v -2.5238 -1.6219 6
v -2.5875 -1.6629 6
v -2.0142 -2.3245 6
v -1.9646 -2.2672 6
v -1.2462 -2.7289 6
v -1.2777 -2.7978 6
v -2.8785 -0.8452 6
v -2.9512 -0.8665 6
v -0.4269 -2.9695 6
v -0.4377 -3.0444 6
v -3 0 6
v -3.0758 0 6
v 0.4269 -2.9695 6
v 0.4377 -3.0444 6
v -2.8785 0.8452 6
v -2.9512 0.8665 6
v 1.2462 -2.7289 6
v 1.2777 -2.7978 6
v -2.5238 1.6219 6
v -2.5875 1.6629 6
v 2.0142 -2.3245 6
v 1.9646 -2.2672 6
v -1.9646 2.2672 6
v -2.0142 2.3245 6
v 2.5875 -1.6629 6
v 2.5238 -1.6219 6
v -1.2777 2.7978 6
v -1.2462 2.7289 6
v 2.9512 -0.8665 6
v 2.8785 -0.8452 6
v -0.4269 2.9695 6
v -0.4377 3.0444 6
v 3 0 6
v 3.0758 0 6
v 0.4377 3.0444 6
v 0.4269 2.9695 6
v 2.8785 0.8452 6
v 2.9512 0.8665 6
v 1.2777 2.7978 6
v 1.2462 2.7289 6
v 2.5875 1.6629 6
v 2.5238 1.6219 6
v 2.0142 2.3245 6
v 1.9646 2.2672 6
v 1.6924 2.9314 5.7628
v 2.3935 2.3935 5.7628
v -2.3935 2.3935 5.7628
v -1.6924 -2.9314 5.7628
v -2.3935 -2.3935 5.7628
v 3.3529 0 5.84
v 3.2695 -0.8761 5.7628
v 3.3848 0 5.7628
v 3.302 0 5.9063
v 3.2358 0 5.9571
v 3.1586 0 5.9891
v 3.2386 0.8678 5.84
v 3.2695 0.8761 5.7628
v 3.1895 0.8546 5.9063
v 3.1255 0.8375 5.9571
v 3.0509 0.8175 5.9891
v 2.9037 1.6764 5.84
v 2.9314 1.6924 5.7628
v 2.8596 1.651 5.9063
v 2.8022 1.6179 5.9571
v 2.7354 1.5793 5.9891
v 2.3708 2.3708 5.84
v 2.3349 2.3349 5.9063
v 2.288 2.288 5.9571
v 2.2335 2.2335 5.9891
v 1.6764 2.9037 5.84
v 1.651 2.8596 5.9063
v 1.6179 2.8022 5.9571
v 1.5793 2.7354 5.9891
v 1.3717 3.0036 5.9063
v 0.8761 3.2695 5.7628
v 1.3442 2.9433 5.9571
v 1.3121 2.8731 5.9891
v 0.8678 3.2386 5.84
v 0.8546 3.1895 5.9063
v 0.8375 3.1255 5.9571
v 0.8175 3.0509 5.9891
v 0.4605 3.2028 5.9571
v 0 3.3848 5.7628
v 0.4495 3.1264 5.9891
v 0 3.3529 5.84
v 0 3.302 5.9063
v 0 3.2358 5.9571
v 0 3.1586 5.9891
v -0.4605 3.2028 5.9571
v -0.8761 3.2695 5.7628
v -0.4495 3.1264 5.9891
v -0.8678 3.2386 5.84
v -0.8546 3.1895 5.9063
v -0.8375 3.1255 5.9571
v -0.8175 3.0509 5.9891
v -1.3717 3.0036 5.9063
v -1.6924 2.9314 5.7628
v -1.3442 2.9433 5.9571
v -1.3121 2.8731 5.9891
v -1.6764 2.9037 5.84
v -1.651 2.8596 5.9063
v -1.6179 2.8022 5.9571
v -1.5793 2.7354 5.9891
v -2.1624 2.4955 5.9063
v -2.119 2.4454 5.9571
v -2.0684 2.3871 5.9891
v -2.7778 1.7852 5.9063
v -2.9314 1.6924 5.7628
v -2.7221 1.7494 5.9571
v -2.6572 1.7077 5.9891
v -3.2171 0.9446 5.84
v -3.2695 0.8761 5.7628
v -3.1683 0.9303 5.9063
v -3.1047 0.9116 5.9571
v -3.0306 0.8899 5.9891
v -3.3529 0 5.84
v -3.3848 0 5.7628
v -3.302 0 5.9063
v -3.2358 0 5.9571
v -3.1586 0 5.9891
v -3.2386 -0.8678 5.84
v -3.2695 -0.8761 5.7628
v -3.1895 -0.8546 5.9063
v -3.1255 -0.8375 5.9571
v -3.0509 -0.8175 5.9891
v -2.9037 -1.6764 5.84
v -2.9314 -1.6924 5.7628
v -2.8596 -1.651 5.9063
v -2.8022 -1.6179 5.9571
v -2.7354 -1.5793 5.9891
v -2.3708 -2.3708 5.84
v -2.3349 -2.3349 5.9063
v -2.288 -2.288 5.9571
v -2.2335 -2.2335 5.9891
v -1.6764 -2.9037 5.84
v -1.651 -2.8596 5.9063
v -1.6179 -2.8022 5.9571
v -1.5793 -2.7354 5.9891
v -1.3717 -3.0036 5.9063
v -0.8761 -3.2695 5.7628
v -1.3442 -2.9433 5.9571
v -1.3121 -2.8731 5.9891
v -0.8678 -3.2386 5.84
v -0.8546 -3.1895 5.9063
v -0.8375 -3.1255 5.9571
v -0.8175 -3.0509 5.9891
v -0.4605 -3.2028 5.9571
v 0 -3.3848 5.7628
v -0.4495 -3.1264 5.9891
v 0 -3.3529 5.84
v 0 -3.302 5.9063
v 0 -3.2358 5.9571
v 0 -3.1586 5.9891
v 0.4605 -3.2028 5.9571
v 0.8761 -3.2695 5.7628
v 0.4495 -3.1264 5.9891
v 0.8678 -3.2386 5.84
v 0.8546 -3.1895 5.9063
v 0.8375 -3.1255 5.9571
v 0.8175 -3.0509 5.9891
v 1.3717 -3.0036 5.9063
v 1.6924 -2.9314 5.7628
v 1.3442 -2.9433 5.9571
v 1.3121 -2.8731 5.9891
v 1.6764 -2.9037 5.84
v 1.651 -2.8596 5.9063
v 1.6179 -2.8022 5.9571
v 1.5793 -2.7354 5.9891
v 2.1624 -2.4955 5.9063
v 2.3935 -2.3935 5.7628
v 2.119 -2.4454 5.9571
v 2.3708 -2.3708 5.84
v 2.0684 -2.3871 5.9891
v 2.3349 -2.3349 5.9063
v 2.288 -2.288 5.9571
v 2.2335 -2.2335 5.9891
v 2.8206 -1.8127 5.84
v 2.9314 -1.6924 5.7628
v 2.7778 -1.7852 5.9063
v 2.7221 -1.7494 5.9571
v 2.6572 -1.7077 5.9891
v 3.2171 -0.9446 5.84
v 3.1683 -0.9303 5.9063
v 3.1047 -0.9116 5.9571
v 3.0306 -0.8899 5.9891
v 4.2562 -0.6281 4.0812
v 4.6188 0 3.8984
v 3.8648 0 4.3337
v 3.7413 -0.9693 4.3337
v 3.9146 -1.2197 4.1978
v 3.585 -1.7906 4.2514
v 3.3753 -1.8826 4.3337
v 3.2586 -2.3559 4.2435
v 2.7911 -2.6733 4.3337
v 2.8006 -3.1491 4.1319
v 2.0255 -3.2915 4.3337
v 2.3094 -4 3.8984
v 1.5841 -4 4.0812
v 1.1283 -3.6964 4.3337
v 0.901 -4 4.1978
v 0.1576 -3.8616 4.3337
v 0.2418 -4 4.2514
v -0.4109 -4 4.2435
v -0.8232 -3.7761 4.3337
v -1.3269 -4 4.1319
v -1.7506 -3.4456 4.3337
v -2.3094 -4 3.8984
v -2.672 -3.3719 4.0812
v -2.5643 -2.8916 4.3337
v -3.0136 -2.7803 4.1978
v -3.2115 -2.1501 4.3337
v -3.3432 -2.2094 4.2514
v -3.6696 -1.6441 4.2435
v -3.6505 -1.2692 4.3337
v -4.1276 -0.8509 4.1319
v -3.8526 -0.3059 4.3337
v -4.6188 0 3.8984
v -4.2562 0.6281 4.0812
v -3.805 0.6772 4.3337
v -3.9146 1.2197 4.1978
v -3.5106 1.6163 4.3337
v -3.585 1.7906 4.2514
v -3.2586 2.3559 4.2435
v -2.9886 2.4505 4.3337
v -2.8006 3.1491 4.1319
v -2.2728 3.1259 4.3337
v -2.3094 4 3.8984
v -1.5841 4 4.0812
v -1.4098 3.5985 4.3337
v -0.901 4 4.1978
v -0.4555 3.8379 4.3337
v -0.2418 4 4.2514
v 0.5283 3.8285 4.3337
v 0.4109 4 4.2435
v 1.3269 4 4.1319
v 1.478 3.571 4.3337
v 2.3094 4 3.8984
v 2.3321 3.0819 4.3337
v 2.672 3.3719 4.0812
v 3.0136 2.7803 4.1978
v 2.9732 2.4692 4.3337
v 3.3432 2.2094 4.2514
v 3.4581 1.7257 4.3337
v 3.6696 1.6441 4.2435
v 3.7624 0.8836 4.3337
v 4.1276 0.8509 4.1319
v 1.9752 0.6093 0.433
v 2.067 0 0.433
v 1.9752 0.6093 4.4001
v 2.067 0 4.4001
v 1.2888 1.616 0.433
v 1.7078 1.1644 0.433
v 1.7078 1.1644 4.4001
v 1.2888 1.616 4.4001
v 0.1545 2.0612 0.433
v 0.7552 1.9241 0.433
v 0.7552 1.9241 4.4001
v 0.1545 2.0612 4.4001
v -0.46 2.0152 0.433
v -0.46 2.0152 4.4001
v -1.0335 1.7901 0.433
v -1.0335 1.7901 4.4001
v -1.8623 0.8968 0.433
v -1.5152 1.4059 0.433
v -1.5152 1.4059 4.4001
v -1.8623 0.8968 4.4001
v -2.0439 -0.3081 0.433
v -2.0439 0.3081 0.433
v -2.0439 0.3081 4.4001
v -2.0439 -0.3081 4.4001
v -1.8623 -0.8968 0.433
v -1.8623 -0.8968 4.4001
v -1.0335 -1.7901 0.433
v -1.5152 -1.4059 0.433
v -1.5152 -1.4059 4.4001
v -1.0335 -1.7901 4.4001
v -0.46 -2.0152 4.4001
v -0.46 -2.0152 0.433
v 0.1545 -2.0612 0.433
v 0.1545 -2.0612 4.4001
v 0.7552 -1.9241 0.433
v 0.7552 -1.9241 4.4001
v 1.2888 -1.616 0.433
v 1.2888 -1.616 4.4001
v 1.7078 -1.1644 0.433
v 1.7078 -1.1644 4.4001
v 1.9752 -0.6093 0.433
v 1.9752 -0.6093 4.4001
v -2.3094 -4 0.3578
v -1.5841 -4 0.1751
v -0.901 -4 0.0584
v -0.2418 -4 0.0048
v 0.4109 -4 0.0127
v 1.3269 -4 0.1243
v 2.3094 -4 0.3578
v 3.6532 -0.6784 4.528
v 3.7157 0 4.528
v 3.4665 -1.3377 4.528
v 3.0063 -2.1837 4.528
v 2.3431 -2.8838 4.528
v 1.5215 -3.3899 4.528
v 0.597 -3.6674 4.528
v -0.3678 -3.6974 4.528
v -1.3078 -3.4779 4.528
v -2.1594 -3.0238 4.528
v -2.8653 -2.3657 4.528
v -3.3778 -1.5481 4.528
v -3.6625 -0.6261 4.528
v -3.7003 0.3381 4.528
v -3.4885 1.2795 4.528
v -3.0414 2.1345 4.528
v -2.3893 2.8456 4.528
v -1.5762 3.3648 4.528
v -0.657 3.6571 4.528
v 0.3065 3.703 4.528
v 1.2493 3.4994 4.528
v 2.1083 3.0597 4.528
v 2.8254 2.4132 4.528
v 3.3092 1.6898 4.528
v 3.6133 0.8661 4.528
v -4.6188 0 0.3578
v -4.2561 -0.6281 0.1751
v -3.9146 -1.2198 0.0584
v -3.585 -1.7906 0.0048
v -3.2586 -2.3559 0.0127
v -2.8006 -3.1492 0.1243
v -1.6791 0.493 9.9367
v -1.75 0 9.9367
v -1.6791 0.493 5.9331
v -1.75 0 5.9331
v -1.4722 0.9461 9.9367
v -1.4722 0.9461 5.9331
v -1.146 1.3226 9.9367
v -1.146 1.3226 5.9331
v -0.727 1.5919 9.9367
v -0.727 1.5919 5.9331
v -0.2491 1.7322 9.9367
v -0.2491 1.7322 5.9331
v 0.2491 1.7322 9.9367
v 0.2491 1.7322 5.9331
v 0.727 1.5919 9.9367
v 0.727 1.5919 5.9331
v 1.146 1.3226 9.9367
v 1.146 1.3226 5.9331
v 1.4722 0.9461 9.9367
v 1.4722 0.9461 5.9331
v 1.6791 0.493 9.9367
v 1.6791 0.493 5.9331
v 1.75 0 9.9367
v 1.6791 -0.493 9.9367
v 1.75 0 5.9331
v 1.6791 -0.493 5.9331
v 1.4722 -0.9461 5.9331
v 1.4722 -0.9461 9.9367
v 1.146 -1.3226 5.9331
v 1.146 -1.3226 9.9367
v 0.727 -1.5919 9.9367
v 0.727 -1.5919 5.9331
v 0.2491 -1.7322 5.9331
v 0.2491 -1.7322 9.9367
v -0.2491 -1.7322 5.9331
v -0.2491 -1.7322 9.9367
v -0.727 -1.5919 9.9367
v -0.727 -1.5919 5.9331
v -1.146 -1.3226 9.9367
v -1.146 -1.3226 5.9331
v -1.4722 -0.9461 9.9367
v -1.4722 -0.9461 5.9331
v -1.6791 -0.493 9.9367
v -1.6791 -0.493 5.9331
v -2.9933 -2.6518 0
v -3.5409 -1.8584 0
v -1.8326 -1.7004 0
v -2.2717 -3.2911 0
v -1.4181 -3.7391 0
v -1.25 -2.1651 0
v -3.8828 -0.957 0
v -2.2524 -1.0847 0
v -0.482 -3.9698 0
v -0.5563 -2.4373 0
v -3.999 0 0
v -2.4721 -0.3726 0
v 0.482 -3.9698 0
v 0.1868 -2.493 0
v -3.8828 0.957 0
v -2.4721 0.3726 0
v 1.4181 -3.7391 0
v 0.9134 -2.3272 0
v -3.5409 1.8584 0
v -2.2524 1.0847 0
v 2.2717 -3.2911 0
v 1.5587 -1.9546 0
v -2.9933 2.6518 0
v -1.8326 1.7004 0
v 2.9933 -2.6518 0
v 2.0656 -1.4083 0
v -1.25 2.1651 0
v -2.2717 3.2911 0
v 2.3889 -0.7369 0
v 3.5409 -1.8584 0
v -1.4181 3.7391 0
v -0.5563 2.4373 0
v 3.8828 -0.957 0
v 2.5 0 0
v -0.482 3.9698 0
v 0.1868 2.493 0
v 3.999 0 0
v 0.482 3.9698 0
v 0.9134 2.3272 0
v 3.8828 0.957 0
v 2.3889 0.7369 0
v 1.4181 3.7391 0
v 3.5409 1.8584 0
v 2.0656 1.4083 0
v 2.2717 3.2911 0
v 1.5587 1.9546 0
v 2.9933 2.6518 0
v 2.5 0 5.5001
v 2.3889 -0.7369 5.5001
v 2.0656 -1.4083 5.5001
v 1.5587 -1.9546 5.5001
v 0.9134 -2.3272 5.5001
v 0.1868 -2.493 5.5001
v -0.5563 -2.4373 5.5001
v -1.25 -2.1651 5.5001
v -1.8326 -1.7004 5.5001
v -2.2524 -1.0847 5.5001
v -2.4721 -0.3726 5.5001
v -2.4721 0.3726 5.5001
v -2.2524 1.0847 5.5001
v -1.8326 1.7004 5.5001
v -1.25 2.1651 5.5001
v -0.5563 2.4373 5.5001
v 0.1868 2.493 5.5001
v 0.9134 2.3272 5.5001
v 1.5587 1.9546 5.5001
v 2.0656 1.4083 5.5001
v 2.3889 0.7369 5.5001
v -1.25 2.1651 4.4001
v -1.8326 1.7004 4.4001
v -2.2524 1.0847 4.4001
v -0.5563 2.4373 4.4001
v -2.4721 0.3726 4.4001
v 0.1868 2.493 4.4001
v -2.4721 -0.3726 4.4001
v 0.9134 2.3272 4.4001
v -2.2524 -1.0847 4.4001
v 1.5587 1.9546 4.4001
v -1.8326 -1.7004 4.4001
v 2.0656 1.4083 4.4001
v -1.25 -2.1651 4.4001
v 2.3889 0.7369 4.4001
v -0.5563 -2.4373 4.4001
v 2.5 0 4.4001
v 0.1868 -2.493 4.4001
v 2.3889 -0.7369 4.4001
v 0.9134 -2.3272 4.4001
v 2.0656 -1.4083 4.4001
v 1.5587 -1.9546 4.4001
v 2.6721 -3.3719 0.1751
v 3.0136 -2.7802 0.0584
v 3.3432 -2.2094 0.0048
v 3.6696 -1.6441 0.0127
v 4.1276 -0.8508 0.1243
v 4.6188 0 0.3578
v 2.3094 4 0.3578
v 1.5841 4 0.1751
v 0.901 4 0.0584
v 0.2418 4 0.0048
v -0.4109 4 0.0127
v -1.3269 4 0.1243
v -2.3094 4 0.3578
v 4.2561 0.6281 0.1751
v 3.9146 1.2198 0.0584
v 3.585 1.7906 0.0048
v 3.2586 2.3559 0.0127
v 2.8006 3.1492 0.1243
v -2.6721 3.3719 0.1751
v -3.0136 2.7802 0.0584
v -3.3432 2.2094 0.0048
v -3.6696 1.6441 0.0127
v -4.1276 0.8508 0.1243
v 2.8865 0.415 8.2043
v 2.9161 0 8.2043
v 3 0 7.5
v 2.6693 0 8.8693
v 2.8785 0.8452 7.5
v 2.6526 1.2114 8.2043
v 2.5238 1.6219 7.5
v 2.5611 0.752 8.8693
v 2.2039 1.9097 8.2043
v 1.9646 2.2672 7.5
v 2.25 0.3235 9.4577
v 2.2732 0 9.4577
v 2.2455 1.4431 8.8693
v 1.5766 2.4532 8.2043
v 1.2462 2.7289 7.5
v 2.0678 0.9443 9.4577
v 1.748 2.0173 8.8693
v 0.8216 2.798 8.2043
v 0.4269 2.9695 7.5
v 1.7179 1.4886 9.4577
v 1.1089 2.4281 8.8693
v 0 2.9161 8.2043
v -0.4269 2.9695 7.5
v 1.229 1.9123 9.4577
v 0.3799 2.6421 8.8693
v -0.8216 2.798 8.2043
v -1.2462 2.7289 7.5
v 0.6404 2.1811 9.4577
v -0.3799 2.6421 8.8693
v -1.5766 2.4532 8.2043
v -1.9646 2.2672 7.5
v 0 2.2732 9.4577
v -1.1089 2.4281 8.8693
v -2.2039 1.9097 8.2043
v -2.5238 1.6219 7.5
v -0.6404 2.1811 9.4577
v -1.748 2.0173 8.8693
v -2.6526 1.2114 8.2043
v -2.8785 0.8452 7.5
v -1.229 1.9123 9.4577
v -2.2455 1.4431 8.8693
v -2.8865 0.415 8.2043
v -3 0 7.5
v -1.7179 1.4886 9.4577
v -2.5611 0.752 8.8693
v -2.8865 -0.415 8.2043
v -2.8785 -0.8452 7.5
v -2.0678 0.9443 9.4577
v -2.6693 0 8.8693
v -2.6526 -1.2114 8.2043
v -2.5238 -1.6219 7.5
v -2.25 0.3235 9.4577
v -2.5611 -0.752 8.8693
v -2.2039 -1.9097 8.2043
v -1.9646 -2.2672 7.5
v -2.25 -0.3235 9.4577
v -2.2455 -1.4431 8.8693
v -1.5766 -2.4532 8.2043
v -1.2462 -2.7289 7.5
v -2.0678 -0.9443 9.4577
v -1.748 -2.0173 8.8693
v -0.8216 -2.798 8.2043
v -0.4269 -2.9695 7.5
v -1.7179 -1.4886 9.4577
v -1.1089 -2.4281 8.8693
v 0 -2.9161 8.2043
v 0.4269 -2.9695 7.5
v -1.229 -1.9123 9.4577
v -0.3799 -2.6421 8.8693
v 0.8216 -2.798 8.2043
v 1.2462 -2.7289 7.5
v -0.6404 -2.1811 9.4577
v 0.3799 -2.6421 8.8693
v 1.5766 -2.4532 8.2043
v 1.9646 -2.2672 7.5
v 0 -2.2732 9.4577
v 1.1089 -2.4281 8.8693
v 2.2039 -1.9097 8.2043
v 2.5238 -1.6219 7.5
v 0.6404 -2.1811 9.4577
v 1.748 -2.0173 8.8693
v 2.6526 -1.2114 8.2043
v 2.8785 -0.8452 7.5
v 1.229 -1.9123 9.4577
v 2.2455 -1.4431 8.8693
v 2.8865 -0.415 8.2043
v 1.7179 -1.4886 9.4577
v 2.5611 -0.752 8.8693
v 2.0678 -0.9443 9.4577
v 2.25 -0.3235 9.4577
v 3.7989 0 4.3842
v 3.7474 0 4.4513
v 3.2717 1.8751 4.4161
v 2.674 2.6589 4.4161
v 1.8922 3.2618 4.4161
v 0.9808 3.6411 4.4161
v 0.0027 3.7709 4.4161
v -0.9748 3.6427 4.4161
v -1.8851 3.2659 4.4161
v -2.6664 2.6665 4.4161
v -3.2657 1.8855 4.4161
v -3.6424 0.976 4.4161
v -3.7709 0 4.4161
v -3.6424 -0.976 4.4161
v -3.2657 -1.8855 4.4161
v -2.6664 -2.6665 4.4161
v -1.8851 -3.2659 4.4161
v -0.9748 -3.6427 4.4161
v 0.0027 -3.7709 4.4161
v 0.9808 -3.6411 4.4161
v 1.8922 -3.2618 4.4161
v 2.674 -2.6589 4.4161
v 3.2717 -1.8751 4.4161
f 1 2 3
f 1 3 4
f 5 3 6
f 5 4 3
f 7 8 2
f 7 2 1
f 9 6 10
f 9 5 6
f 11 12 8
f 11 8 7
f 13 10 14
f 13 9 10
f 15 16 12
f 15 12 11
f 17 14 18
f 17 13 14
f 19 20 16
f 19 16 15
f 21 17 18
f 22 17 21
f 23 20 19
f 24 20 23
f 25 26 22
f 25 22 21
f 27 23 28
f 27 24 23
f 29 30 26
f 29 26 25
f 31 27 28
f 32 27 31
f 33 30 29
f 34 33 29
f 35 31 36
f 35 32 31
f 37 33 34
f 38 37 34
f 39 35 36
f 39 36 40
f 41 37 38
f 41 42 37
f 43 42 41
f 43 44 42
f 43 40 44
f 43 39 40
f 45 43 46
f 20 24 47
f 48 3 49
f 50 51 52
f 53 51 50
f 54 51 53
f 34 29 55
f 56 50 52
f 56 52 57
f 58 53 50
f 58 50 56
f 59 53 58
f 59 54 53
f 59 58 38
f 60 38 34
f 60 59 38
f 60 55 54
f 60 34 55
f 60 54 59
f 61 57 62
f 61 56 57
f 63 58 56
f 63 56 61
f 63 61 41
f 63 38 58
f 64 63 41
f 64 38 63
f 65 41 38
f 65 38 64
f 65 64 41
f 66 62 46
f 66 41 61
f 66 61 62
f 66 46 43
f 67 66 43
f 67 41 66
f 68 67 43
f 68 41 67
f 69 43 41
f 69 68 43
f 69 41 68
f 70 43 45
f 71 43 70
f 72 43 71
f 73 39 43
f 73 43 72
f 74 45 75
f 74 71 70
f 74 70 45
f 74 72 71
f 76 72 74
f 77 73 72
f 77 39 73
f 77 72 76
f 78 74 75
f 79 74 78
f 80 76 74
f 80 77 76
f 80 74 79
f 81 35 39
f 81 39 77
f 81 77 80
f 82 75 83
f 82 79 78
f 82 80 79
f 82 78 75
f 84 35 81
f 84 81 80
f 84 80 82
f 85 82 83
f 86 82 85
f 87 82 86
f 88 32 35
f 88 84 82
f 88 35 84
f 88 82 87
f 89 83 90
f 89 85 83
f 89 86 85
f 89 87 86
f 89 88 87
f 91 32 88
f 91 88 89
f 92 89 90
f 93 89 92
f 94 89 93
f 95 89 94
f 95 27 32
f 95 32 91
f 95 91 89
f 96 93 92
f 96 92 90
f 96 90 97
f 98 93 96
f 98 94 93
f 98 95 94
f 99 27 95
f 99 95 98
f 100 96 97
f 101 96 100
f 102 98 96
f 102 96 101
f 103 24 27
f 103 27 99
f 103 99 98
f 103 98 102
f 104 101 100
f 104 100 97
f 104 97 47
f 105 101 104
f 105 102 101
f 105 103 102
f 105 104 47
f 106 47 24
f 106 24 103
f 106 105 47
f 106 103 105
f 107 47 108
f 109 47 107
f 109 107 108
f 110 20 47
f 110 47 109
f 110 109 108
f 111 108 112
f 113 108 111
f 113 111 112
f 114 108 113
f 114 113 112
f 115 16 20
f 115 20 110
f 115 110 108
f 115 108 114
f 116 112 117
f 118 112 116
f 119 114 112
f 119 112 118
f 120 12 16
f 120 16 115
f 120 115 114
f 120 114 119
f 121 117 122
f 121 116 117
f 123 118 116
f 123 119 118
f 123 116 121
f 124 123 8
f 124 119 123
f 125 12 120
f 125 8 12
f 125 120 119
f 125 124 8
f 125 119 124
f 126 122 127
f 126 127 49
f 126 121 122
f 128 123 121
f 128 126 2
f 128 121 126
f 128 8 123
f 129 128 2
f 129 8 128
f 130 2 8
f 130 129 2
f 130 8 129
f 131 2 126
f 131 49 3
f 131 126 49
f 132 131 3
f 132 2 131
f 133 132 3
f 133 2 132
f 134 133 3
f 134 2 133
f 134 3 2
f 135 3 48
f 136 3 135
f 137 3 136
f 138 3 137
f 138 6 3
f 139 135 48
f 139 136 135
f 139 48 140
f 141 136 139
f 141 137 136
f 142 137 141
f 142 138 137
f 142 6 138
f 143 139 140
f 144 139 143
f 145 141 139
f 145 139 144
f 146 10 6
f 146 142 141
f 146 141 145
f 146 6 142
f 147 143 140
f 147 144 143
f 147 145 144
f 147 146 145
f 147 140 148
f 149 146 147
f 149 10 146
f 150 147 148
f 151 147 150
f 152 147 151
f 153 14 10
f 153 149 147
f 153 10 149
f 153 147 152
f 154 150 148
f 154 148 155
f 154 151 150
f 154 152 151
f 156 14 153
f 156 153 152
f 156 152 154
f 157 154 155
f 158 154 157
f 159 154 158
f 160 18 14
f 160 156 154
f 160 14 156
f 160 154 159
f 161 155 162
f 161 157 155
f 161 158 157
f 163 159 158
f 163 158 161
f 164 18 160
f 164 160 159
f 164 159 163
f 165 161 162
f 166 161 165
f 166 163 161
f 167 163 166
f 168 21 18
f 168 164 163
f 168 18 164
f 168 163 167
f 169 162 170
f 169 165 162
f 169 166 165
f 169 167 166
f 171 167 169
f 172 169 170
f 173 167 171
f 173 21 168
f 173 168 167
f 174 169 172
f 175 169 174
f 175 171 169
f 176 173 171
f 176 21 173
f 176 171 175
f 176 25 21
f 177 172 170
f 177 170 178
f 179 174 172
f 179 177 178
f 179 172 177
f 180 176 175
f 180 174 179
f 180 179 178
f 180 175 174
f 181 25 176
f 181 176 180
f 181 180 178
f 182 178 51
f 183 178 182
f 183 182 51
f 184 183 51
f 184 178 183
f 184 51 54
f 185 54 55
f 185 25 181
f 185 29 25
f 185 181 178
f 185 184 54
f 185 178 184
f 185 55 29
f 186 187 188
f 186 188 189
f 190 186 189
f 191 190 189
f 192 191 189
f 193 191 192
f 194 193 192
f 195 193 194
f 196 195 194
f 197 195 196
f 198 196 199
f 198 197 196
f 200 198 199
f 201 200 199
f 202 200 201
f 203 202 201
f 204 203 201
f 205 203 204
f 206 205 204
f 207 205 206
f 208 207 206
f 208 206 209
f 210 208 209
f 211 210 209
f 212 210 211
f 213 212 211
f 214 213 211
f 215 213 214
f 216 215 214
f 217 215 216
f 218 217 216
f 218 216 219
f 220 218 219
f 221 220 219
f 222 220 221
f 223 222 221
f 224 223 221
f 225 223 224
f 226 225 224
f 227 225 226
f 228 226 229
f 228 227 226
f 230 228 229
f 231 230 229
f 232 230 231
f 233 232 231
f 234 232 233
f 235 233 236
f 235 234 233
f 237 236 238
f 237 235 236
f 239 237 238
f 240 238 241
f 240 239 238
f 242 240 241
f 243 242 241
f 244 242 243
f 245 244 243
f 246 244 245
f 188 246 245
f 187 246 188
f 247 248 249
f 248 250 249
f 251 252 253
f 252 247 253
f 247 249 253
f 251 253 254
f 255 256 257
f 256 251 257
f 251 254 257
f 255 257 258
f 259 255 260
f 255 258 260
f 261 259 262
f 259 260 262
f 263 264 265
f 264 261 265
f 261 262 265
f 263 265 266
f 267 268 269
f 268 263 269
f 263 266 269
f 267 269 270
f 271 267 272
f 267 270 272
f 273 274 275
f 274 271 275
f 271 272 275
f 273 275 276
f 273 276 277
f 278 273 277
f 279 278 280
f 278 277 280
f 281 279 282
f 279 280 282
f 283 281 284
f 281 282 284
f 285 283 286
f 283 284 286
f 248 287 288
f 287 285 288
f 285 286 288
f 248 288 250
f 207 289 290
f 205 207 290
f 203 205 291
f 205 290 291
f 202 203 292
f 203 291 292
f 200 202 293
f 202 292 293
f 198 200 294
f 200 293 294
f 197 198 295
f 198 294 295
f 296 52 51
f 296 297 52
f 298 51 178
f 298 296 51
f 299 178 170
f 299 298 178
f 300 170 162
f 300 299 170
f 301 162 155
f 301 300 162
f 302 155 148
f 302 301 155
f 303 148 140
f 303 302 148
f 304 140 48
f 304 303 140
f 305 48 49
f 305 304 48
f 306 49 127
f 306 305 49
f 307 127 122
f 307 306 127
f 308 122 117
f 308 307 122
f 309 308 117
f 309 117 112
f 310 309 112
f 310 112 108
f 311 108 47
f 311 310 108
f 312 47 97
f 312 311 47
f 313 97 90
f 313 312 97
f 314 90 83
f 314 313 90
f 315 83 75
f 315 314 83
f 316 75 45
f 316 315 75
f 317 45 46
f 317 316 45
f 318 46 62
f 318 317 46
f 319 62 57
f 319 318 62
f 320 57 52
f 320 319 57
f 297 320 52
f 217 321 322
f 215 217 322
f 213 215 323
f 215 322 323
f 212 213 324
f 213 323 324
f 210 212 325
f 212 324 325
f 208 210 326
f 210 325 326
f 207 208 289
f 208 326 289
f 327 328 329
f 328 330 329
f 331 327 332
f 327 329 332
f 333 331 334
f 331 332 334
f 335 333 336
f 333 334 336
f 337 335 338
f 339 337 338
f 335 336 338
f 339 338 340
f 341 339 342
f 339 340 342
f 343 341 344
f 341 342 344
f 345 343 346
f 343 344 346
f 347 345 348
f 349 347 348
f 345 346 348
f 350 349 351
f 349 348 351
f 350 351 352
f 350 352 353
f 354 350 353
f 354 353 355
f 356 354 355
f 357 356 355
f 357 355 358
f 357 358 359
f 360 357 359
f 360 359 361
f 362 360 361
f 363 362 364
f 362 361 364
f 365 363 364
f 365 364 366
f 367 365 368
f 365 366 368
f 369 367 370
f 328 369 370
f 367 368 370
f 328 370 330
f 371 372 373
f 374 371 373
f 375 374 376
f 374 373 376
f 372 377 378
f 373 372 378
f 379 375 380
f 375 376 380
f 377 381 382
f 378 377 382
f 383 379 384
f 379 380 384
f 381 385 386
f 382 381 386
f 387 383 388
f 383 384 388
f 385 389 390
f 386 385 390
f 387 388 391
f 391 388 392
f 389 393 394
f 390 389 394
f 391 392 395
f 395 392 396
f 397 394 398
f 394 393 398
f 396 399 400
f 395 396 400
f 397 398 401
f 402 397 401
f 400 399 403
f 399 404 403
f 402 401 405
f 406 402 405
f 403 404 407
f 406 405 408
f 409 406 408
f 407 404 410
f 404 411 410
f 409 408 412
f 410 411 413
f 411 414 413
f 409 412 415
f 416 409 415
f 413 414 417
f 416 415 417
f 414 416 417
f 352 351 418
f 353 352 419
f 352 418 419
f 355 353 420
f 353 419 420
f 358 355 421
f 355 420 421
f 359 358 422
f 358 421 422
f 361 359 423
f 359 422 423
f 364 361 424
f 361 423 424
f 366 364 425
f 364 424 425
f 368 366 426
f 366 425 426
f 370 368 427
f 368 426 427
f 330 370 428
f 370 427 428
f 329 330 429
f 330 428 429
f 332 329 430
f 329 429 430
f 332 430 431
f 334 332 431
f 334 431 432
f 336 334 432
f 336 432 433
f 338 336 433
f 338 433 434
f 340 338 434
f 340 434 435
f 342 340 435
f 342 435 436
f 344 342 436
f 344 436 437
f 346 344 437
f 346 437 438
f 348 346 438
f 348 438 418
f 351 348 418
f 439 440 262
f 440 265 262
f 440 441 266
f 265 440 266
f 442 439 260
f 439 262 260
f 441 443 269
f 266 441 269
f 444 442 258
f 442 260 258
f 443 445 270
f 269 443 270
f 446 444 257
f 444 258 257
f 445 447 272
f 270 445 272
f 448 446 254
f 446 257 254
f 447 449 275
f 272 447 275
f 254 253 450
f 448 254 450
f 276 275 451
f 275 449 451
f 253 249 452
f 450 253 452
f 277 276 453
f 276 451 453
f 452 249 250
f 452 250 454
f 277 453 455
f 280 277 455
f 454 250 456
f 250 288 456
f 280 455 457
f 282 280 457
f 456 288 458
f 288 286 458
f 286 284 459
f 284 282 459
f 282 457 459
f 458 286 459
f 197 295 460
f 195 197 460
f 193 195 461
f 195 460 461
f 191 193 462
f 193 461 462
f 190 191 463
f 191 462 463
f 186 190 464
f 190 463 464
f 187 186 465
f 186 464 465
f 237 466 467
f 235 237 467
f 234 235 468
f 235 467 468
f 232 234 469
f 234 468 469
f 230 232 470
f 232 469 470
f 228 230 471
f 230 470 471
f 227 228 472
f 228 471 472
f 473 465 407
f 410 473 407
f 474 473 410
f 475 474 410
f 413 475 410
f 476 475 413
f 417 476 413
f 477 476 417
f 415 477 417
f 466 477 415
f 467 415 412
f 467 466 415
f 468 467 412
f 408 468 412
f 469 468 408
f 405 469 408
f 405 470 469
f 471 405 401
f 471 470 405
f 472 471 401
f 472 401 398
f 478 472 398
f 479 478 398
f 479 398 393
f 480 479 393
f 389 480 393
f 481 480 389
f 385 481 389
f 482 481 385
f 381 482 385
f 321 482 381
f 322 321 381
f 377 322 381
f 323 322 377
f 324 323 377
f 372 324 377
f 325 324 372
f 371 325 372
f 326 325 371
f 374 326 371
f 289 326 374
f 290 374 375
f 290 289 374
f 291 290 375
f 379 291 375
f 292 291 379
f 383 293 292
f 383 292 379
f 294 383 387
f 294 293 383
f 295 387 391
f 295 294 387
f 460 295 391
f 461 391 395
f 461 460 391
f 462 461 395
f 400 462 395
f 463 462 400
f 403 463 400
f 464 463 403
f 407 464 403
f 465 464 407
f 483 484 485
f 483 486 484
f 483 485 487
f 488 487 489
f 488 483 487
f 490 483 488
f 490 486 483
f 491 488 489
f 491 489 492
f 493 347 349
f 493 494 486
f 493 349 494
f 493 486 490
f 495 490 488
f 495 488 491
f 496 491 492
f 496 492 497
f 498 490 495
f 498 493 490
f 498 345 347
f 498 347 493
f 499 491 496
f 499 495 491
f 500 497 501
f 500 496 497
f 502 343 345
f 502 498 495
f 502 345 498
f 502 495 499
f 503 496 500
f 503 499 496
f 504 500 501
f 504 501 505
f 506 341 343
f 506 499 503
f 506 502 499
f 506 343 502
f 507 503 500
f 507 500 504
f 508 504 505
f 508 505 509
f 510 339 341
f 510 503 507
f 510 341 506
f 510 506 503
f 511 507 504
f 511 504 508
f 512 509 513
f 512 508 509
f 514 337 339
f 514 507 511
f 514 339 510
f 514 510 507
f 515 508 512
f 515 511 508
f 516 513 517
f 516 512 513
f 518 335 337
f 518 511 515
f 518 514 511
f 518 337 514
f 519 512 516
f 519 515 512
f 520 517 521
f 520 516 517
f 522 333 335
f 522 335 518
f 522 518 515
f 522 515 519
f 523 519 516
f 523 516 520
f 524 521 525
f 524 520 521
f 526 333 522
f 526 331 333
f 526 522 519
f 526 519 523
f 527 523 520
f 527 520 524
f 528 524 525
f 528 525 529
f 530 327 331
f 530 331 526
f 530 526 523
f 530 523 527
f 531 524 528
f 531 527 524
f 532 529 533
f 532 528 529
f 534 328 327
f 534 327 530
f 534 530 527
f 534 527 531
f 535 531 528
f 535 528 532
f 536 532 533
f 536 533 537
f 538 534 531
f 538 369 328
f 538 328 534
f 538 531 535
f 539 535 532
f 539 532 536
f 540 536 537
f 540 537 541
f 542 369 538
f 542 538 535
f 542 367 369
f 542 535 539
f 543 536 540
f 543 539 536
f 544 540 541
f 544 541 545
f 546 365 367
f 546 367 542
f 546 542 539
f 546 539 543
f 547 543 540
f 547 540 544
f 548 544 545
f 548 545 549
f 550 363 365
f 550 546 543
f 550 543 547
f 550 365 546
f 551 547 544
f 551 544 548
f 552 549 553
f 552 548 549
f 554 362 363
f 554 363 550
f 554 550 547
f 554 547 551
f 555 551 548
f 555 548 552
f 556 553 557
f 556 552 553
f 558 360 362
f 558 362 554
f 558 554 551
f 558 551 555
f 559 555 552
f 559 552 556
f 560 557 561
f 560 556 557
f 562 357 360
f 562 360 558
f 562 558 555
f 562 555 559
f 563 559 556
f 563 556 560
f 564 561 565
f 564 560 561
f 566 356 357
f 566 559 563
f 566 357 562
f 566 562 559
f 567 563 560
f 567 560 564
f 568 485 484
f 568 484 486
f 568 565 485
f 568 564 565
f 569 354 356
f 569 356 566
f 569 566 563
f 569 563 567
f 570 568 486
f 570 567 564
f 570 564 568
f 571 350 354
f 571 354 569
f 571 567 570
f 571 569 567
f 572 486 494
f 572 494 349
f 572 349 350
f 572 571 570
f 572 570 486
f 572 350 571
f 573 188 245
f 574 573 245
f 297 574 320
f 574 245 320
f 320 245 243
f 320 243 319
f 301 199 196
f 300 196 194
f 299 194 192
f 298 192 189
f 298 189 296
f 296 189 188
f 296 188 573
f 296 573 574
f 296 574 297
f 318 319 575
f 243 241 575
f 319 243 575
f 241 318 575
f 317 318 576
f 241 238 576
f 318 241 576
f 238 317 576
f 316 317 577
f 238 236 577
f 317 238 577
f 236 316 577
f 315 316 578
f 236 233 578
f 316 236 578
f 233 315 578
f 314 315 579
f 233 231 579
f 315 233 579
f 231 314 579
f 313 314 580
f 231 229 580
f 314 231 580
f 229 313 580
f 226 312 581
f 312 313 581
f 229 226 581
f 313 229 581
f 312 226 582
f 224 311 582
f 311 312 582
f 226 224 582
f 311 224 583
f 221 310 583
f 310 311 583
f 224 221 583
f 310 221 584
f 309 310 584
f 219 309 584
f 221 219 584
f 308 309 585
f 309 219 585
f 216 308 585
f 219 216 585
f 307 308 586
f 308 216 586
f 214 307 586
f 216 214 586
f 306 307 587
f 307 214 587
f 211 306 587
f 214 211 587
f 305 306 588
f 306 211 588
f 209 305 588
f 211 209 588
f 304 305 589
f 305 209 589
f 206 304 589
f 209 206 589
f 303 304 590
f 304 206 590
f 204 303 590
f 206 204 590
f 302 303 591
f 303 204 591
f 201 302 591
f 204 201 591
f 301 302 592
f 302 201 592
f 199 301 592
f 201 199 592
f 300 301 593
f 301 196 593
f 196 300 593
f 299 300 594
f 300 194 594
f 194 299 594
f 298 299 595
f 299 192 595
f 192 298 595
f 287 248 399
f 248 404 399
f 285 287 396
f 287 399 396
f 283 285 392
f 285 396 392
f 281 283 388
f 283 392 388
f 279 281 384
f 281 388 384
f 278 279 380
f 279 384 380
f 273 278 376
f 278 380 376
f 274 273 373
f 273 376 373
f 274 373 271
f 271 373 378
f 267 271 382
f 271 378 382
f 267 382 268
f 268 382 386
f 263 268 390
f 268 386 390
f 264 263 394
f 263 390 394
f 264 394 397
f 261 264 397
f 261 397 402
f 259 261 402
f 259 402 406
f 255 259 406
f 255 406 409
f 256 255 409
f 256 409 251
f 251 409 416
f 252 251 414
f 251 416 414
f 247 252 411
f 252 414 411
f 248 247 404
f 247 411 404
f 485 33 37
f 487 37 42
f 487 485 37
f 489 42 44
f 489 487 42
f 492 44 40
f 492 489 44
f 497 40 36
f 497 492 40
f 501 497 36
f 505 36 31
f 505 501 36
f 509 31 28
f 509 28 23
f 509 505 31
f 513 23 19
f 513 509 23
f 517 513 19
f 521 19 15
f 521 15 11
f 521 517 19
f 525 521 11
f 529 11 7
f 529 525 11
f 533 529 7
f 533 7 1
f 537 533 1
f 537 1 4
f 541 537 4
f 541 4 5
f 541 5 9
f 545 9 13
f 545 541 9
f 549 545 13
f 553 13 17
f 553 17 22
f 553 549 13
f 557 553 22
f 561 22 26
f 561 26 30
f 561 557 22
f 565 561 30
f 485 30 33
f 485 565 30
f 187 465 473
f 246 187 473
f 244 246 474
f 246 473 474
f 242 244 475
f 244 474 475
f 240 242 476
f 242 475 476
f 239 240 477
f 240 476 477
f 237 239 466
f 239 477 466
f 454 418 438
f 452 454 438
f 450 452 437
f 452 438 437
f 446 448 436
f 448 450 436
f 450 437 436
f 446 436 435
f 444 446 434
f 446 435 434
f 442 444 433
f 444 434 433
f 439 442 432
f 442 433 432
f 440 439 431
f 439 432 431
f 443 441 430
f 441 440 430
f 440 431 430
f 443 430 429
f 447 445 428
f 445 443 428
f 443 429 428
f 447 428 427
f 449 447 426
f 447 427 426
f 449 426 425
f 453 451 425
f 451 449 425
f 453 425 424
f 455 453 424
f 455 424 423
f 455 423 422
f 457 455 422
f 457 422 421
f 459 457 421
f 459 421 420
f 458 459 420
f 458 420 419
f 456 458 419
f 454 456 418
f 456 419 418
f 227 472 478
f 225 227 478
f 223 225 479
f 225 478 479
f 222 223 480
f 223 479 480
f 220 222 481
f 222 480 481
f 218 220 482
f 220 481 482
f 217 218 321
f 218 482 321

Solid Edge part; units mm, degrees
sketch "Sketch1" plane through (0, 0, 0) normal (0, 0, 1) x (1, 0, 0)
  circle A0 centre (0, 0) radius 4.6188
  dimension "D1" = 4
extrude "Protrusion1" add sketch "Sketch1" along normal blind 6
sketch "Sketch2" plane through (0, 0, 0) normal (0, 0, 1) x (1, 0, 0)
  arc A0 (2.3094, 4) -> (4.6188, 0) centre (0, 0) cw
  line L0 (4.6188, 0) -> (2.3094, 4)
  dimension "D1" = 4
extrude "ExtrudedCutout_1" cut sketch "Sketch2" along normal blind 6
pattern_circular "Pattern1" count 6 over 360 about axis through (0, 0, 0) along (0, 0, 1) of "ExtrudedCutout_1"
sketch "Sketch3" plane through (0, 0, 0) normal (0, -1, 0) x (1, 0, 0)
  line L0 (0, 0) -> (3, 0)
  line L1 (3, 0) -> (3, 7.5)
  arc A0 (3, 7.5) -> (0, 10.5) centre (0, 7.5) ccw
  dimension "D1" = 10.5
  dimension "D2" = 3
revolve "RevolvedProtrusion_1" add sketch "Sketch3" angle 360 about axis through (0, 0, 18.1) along (0, 0, -1)
sketch "Sketch4" plane through (0, 0, 0) normal (0, -1, 0) x (1, 0, 0)
  line L0 (0, 0) -> (2.067, 0)
  line L1 (2.067, 0) -> (2.067, 4.4001)
  line L2 (2.067, 4.4001) -> (2.5, 4.4001)
  line L3 (2.5, 4.4001) -> (2.5, 5.5001)
  line L4 (2.5, 5.5001) -> (0, 6.9435)
  dimension "D1" = 2.067
  dimension "D2" = 2.5
  dimension "D3" = 4.4001
  dimension "D4" = 1.1
revolve "RevolvedCutout_1" cut sketch "Sketch4" angle 360 about axis through (0, 0, 12.9269) along (0, 0, -1)
sketch "Sketch5" plane through (0, 0, 0) normal (0, -1, 0) x (1, 0, 0)
  line L0 (3.3213, 6) -> (7.4285, 6)
  line L1 (7.4285, 6) -> (7.4285, 2.2762)
  line L2 (7.4285, 2.2762) -> (3.75, 4.4)
  line L3 (3.75, 4.4) -> (3.3213, 6)
  line L4 (3.999, 0) -> (7.4285, 1.98)
  line L5 (7.4285, 1.98) -> (7.4285, 0)
  line L6 (7.4285, 0) -> (3.999, 0)
  dimension "D1" = 3.999
  dimension "D2" = 1.98
  dimension "D3" = 3.75
  dimension "D4" = 4.4
  dimension "D5" = 1.6
revolve "RevolvedCutout_2" cut sketch "Sketch5" angle 360 about axis through (0, 0, 0) along (0, 0, 1)
fillet "Round_1" radius 0.32 2 edges at (-3.3213, 0, 6) (-3.75, 0, 4.4)
cosmetic_thread "Thread_1" size "M5" thread depth 4.4
chamfer "Chamfer_1" distance 0.433 angle 45 1 edges at (-2.067, 0, 0)
sketch "Sketch6" plane through (0, 0, 0) normal (0, 0, -1) x (-1, 0, 0)
  circle A0 centre (0, 0) radius 1.75
  dimension "D1" = 3.5
extrude "Cutout6" cut sketch "Sketch6" against normal through all
properties part number "NK108" material "Stahl"
